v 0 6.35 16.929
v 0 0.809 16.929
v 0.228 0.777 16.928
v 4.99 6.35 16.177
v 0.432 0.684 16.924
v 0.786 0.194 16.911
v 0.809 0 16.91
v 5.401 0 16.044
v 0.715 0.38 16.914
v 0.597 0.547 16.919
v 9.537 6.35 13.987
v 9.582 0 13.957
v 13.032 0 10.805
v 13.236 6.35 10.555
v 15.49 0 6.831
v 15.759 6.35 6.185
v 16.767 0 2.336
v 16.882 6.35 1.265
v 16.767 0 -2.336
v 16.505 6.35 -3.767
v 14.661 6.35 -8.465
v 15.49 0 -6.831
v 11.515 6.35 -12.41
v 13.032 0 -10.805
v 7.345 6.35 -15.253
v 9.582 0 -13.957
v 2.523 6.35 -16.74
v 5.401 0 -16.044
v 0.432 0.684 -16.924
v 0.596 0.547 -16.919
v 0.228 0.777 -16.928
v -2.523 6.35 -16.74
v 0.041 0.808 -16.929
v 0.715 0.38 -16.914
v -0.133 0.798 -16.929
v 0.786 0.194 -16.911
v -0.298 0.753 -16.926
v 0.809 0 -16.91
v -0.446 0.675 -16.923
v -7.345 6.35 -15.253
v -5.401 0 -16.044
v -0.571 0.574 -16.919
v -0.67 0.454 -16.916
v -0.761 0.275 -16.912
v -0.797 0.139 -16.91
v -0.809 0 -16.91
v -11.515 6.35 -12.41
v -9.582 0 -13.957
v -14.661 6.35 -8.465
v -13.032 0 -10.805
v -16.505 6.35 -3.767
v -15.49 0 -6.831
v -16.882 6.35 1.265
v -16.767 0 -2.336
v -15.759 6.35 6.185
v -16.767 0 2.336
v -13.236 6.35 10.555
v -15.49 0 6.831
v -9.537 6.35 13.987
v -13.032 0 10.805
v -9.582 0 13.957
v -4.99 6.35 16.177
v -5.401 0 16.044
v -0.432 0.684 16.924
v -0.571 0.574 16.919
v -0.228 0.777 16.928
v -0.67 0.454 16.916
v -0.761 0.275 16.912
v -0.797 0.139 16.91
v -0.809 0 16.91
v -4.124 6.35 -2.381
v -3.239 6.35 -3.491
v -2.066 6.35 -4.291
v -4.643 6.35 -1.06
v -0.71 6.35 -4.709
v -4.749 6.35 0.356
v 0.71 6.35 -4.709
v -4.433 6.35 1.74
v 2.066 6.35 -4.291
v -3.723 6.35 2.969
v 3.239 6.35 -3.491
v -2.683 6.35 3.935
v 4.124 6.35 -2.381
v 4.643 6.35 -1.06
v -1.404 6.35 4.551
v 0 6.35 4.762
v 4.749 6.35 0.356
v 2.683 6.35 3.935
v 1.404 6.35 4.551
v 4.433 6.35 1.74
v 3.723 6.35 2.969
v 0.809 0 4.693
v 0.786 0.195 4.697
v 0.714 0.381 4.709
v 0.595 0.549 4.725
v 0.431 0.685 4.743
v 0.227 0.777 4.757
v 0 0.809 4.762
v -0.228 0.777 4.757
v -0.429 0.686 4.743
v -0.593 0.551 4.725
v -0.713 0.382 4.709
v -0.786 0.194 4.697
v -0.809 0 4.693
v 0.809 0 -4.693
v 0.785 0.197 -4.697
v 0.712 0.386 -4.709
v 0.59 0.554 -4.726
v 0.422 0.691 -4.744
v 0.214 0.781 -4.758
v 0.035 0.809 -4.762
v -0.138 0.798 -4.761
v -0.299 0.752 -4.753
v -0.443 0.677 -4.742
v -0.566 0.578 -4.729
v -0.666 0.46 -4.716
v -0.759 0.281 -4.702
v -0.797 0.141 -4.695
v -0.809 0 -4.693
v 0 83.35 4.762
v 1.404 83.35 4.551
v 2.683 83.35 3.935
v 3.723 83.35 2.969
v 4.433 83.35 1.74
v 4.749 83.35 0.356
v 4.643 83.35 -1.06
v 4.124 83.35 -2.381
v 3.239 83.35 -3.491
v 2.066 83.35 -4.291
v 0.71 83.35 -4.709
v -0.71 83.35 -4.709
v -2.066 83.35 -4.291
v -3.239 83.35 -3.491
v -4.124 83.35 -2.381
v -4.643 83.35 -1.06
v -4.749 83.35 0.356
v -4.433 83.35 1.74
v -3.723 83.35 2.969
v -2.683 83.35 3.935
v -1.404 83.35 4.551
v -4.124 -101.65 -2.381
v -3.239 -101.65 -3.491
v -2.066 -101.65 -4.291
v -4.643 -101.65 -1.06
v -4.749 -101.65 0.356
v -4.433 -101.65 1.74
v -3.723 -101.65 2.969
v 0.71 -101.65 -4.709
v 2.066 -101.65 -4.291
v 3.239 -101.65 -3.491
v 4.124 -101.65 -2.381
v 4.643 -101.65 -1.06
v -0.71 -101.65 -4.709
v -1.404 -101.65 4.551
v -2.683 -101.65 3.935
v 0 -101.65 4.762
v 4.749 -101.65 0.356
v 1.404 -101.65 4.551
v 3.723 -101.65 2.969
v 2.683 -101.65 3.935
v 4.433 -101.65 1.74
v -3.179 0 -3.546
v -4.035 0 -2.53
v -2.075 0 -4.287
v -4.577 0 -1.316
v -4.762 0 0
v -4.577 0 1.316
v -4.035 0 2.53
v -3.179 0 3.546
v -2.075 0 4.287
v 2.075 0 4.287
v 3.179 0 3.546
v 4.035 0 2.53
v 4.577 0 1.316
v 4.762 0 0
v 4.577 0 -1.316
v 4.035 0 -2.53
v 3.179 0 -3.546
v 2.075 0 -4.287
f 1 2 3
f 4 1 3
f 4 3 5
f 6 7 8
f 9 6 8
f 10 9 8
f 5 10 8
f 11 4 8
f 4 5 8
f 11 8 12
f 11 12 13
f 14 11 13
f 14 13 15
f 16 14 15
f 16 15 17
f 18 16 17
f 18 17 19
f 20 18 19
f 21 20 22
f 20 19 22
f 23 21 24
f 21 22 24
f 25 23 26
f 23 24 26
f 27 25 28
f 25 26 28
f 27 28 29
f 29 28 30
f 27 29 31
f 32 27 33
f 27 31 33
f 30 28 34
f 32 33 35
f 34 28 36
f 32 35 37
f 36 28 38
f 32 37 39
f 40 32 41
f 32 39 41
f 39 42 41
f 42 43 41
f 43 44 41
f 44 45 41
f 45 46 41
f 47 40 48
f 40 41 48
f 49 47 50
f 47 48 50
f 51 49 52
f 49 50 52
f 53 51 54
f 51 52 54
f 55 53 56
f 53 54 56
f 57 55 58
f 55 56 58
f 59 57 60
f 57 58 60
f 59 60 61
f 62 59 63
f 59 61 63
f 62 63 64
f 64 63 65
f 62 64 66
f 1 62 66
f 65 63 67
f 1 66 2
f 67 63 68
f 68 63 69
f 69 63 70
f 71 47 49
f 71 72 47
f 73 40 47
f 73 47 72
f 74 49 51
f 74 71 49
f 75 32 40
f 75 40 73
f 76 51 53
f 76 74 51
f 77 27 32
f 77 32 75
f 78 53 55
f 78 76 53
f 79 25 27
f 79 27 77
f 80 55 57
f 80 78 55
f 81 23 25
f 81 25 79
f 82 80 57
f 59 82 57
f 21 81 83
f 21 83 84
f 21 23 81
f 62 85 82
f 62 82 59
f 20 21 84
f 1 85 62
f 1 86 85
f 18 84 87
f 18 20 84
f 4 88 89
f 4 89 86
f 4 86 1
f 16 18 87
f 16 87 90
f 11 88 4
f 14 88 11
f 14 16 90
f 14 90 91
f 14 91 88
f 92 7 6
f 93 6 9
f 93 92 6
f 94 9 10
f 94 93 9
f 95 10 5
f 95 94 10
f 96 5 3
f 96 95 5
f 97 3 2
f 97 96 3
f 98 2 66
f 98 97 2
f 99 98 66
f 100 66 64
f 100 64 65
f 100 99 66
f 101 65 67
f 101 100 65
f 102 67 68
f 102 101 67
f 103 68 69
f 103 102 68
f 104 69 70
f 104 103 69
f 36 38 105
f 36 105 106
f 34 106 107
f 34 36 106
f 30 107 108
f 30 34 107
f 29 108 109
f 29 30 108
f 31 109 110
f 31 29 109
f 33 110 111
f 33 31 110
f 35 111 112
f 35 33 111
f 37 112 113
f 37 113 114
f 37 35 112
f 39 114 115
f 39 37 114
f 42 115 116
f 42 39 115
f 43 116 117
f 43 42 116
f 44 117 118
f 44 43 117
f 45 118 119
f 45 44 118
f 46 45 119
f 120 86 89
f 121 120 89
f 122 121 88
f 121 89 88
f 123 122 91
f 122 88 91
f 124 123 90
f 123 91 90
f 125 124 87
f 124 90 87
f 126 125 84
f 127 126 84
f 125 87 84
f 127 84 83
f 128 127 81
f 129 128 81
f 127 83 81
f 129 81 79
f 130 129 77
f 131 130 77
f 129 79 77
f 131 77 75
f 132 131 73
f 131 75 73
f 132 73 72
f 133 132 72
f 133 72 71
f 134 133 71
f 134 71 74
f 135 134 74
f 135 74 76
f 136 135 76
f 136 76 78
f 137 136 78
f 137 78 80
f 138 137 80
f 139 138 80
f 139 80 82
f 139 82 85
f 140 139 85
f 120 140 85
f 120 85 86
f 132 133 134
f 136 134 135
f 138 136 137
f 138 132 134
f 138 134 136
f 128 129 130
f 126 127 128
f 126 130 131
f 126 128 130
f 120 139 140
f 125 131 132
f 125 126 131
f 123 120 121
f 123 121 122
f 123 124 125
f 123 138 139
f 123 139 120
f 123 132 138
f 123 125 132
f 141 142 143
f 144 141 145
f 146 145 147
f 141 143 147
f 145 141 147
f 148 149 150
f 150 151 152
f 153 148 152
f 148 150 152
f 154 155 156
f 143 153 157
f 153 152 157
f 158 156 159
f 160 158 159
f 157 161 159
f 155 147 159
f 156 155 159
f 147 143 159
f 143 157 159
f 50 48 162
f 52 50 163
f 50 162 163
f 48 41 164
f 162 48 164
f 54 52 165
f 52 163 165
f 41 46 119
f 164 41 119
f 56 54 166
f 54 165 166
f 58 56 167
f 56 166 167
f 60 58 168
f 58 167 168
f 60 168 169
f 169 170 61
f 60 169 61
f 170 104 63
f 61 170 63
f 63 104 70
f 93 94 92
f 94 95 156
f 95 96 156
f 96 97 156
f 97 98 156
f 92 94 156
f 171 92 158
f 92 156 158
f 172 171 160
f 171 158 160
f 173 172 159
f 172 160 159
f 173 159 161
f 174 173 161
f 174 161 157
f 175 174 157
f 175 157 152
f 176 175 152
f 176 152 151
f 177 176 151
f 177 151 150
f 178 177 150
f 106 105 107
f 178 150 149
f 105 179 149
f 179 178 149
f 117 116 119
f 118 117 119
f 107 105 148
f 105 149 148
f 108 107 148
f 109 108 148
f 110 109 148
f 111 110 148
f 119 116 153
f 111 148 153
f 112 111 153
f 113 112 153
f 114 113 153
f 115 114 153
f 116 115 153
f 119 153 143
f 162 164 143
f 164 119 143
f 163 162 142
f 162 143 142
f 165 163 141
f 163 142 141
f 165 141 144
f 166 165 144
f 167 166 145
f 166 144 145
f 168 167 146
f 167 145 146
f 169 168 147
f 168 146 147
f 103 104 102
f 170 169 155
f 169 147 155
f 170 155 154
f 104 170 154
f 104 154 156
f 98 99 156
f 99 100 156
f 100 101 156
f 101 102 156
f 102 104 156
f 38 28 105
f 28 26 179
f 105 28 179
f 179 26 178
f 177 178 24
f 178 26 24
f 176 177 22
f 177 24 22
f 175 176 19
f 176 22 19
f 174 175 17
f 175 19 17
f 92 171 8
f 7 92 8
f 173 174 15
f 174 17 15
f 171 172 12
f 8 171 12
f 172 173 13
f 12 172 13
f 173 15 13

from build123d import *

# Parameters (mm, degrees)
SKETCH1_R                = 16.9291
BOSS_EXTRUDE1_DEPTH      = 6.35
CUT_EXTRUDE1_DEPTH       = 25.769161343
CUT_EXTRUDE1_DEPTH_BACK  = 25.769161343
SKETCH2_R                = 0.809435985
BOSS_EXTRUDE3_DEPTH      = 77
BOSS_EXTRUDE3_DEPTH_BACK = 108
SKETCH3_R                = 4.7625


with BuildPart() as part:
    # Sketch1 → Boss-Extrude1 (new body)
    with BuildSketch(Plane(origin=(0, 0, 0), x_dir=(1, 0, 0), z_dir=(0, 1, 0))):
        with Locations(Location((0, 0, 0), (0, 0, 270))):
            Circle(SKETCH1_R)
    extrude(amount=BOSS_EXTRUDE1_DEPTH)

    # Sketch2 → Cut-Extrude1 (cut, two sides: drawn at the far end of the back side and taken through both)
    with BuildSketch(Plane.XY.offset(-CUT_EXTRUDE1_DEPTH_BACK)):
        Circle(SKETCH2_R)
    extrude(amount=CUT_EXTRUDE1_DEPTH + CUT_EXTRUDE1_DEPTH_BACK, mode=Mode.SUBTRACT)

    # Sketch3 → Boss-Extrude3 (add, two sides: drawn at the far end of the back side and taken through both)
    with BuildSketch(Plane(origin=(0, 6.35, 0), x_dir=(1, 0, 0), z_dir=(0, 1, 0)).offset(-BOSS_EXTRUDE3_DEPTH_BACK)):
        with Locations(Location((0, 0, 0), (0, 0, 270))):
            Circle(SKETCH3_R)
    extrude(amount=BOSS_EXTRUDE3_DEPTH + BOSS_EXTRUDE3_DEPTH_BACK)


solid = part.part
